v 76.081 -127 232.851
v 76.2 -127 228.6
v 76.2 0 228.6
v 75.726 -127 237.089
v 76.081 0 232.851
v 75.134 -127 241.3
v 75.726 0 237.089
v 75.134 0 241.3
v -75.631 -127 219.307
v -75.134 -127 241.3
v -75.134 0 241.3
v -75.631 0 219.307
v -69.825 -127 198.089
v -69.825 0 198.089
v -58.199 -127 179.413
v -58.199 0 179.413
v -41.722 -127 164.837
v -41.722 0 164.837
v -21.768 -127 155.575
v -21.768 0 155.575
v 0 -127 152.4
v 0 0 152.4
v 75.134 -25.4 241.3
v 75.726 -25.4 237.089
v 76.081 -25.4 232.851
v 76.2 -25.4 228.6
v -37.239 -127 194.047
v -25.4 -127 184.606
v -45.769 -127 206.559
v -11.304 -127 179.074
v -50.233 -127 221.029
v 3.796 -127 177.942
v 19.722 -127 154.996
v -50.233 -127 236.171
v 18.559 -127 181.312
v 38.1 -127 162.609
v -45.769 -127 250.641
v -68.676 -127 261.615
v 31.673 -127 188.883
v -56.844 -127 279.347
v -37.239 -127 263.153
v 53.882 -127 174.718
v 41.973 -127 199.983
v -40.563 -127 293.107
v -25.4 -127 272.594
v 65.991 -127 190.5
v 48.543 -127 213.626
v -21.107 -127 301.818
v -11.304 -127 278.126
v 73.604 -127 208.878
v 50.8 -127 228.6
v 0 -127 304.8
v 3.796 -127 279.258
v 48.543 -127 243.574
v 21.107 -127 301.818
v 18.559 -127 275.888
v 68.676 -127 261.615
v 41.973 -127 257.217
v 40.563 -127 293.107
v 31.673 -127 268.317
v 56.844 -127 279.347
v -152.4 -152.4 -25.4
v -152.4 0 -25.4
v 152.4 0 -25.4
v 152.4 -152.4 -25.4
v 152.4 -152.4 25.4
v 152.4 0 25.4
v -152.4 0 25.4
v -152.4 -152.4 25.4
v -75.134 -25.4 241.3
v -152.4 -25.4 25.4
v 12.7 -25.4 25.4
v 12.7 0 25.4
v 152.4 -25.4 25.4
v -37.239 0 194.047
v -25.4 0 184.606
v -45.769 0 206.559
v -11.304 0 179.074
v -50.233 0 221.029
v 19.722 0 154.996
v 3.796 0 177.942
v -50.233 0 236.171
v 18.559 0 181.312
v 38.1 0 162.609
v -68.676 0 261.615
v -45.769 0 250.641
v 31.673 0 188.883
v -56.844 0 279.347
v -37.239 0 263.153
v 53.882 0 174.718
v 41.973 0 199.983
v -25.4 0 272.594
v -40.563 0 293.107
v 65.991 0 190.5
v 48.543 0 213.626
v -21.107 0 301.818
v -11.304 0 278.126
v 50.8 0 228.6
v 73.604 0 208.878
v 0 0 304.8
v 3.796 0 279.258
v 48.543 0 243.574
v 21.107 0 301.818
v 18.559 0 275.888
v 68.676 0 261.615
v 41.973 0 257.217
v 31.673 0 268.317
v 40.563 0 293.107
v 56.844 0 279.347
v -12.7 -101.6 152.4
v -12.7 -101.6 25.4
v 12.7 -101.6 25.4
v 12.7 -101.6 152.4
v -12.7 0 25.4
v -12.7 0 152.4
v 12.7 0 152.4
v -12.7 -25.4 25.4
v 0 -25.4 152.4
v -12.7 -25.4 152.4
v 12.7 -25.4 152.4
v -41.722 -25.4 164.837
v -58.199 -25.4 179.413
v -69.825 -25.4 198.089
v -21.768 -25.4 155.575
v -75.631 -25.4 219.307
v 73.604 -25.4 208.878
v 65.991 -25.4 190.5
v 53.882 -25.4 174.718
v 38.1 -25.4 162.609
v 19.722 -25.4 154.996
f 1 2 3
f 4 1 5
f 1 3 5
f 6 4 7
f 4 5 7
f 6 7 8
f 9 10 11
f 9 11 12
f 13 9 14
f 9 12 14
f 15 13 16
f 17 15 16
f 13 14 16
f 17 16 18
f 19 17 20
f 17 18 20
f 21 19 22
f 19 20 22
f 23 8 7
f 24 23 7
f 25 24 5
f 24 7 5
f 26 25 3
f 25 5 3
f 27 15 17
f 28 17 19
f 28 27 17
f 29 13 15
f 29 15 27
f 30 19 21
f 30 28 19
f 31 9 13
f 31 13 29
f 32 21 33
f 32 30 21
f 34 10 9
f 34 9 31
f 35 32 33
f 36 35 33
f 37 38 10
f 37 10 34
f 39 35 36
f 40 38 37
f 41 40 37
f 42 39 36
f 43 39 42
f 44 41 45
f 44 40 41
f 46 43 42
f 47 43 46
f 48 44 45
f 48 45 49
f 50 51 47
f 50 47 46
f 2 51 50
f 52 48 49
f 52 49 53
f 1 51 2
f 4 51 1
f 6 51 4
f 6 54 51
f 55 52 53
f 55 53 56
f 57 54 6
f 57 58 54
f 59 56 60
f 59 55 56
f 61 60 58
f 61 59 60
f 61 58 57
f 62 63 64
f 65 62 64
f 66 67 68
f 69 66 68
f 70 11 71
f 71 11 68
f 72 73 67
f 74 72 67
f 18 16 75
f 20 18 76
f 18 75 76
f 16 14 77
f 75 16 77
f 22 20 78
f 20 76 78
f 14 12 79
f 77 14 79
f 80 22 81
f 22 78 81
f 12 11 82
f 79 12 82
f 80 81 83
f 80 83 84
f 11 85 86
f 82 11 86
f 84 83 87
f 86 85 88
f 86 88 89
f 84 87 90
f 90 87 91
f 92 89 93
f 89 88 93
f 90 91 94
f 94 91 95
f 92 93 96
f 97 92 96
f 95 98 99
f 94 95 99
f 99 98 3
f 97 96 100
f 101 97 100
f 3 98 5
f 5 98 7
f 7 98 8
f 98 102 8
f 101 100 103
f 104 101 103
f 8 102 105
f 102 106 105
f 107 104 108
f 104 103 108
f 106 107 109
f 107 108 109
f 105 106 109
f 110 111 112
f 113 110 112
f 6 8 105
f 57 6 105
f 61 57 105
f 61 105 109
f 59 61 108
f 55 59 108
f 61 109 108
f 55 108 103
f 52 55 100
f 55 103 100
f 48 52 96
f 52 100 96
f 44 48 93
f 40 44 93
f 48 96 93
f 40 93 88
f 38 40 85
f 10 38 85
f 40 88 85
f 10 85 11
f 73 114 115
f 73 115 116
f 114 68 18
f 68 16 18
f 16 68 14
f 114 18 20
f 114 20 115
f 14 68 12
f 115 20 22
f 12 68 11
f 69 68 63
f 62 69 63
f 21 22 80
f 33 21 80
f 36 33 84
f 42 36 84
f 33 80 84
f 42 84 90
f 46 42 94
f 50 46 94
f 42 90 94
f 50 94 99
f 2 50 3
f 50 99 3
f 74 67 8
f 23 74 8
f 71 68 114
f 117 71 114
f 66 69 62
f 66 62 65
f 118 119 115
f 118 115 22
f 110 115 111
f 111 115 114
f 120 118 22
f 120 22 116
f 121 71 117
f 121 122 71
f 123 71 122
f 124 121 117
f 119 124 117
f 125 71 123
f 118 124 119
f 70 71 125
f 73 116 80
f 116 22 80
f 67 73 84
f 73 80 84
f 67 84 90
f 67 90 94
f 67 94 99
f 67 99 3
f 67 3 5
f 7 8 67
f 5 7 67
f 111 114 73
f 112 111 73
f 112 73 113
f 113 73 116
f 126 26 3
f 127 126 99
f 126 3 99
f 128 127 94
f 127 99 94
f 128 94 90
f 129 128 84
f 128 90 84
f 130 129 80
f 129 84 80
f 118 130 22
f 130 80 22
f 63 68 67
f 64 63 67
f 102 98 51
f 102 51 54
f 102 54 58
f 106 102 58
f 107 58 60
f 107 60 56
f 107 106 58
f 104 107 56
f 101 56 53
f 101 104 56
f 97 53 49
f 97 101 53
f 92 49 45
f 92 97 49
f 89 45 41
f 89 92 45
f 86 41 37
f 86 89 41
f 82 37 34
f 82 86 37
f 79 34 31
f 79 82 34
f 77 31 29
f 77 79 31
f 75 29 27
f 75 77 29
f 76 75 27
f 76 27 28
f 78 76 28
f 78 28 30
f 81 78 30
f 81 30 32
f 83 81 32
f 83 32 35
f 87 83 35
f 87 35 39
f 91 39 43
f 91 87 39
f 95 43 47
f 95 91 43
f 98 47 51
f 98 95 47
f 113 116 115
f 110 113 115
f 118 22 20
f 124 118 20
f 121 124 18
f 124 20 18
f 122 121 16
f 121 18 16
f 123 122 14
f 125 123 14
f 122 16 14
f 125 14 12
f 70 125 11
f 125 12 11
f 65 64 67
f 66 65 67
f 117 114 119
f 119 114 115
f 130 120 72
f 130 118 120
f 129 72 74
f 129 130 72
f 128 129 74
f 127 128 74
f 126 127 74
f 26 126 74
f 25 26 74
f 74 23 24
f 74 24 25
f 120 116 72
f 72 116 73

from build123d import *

# Parameters (mm, degrees)
F1_DEPTH = 152.4
F0_R     = 50.8
F2_DEPTH = 127
F3_DEPTH = 25.4
F4_DEPTH = 101.6


with BuildPart() as f1:
    # F0 (on Front) → F1 (new body)
    with BuildSketch(Plane.XZ):
        Polygon((-12.7, 25.4), (-152.4, 25.4), (-152.4, -25.4), (152.4, -25.4), (152.4, 25.4), (12.7, 25.4), align=None)
    extrude(amount=F1_DEPTH)


with BuildPart() as f2:
    # F0 (on Front) → F2 (new body)
    with BuildSketch(Plane.XZ):
        with BuildLine():
            ThreePointArc((75.134213, 241.3), (0, 304.8), (-75.134213, 241.3))
            ThreePointArc((-75.134213, 241.3), (-58.198711, 179.413112), (0, 152.4))
            ThreePointArc((0, 152.4), (53.881537, 174.718463), (76.2, 228.6))
            ThreePointArc((76.2, 228.6), (75.933086, 234.972321), (75.134213, 241.3))
        make_face()
        with Locations((0, 228.6)):
            Circle(F0_R, mode=Mode.SUBTRACT)
    extrude(amount=F2_DEPTH)


with BuildPart() as f3:
    # F0 (on Front) → F3 (new body)
    with BuildSketch(Plane.XZ):
        with BuildLine():
            Line((12.7, 152.4), (12.7, 25.4))
            Line((12.7, 25.4), (152.4, 25.4))
            Line((152.4, 25.4), (75.134213, 241.3))
            ThreePointArc((75.134213, 241.3), (75.933086, 234.972321), (76.2, 228.6))
            ThreePointArc((76.2, 228.6), (53.881537, 174.718463), (0, 152.4))
            Line((0, 152.4), (12.7, 152.4))
        make_face()
        with BuildLine():
            Line((-75.134213, 241.3), (-152.4, 25.4))
            Line((-152.4, 25.4), (-12.7, 25.4))
            Line((-12.7, 25.4), (-12.7, 152.4))
            Line((-12.7, 152.4), (0, 152.4))
            ThreePointArc((0, 152.4), (-58.198711, 179.413112), (-75.134213, 241.3))
        make_face()
    extrude(amount=F3_DEPTH)


with BuildPart() as f4:
    # F0 (on Front) → F4 (new body)
    with BuildSketch(Plane.XZ):
        Polygon((-12.7, 152.4), (-12.7, 25.4), (12.7, 25.4), (12.7, 152.4), (0, 152.4), align=None)
    extrude(amount=F4_DEPTH)


solid = Compound([f1.part, f2.part, f3.part, f4.part])
